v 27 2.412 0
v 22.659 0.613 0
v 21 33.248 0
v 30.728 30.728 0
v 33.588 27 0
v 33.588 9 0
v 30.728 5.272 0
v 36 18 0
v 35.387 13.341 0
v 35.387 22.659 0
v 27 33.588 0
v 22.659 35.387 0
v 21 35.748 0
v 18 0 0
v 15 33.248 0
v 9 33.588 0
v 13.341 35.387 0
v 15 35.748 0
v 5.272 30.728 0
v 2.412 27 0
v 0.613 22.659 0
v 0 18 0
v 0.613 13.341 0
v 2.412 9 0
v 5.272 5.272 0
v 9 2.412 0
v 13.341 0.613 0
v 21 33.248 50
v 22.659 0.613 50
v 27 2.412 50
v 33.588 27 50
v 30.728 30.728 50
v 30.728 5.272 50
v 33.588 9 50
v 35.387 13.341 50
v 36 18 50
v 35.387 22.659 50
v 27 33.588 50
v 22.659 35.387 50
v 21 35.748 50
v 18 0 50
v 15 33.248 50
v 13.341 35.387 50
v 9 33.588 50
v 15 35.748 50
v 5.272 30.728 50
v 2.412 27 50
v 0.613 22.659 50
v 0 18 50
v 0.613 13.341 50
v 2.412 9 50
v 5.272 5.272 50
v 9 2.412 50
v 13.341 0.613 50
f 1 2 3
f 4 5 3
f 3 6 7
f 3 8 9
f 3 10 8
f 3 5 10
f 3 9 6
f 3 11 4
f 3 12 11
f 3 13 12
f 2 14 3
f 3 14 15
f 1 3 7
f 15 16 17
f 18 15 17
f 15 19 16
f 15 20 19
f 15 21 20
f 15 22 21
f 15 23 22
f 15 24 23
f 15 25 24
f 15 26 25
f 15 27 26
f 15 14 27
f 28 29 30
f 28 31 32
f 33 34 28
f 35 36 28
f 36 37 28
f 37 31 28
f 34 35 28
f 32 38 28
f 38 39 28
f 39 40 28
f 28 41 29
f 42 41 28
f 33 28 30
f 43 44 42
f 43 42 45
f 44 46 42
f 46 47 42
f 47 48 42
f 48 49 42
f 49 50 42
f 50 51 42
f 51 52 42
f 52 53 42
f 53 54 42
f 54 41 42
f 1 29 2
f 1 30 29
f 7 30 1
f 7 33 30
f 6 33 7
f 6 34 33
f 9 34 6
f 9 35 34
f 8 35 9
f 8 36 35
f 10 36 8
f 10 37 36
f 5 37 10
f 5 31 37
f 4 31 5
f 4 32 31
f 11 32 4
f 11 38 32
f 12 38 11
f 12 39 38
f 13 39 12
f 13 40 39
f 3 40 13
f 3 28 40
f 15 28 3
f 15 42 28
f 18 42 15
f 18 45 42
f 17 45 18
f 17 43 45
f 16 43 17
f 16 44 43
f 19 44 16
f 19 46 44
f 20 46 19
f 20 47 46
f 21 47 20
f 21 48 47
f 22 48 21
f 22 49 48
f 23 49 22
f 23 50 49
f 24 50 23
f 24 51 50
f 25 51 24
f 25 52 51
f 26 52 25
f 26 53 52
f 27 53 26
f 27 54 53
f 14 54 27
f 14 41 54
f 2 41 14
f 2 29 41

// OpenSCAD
$fn = 32;

// ----------------------------------------------------------------------
// Keyway shaft: d36 shaft, key 6 x 2.5 mm
// ----------------------------------------------------------------------

// --- parameters (mm) ---
shaft_r = 18;             // shaft radius
key_w = 6;                // keyway width
key_d = 2.5;              // keyway depth below the surface line
plate_t = 50;             // shaft length, Z (extrusion height)

shaft_d = 2 * shaft_r;  // shaft diameter
circle_step = 15;  // polygon sampling step, degrees

profile = [[13.341, 35.387], [9, 33.588], [5.272, 30.728], [2.412, 27], [0.613, 22.659], [0, 18], [0.613, 13.341], [2.412, 9], [5.272, 5.272], [9, 2.412], [13.341, 0.613], [18, 0], [22.659, 0.613], [27, 2.412], [30.728, 5.272], [33.588, 9], [35.387, 13.341], [36, 18], [35.387, 22.659], [33.588, 27], [30.728, 30.728], [27, 33.588], [22.659, 35.387], [21, 35.748], [21, 33.248], [15, 33.248], [15, 35.748]];  // primary outline, 27 points, counter clockwise

// --- the one profile operation ---
linear_extrude(height = plate_t) polygon(points = profile);
